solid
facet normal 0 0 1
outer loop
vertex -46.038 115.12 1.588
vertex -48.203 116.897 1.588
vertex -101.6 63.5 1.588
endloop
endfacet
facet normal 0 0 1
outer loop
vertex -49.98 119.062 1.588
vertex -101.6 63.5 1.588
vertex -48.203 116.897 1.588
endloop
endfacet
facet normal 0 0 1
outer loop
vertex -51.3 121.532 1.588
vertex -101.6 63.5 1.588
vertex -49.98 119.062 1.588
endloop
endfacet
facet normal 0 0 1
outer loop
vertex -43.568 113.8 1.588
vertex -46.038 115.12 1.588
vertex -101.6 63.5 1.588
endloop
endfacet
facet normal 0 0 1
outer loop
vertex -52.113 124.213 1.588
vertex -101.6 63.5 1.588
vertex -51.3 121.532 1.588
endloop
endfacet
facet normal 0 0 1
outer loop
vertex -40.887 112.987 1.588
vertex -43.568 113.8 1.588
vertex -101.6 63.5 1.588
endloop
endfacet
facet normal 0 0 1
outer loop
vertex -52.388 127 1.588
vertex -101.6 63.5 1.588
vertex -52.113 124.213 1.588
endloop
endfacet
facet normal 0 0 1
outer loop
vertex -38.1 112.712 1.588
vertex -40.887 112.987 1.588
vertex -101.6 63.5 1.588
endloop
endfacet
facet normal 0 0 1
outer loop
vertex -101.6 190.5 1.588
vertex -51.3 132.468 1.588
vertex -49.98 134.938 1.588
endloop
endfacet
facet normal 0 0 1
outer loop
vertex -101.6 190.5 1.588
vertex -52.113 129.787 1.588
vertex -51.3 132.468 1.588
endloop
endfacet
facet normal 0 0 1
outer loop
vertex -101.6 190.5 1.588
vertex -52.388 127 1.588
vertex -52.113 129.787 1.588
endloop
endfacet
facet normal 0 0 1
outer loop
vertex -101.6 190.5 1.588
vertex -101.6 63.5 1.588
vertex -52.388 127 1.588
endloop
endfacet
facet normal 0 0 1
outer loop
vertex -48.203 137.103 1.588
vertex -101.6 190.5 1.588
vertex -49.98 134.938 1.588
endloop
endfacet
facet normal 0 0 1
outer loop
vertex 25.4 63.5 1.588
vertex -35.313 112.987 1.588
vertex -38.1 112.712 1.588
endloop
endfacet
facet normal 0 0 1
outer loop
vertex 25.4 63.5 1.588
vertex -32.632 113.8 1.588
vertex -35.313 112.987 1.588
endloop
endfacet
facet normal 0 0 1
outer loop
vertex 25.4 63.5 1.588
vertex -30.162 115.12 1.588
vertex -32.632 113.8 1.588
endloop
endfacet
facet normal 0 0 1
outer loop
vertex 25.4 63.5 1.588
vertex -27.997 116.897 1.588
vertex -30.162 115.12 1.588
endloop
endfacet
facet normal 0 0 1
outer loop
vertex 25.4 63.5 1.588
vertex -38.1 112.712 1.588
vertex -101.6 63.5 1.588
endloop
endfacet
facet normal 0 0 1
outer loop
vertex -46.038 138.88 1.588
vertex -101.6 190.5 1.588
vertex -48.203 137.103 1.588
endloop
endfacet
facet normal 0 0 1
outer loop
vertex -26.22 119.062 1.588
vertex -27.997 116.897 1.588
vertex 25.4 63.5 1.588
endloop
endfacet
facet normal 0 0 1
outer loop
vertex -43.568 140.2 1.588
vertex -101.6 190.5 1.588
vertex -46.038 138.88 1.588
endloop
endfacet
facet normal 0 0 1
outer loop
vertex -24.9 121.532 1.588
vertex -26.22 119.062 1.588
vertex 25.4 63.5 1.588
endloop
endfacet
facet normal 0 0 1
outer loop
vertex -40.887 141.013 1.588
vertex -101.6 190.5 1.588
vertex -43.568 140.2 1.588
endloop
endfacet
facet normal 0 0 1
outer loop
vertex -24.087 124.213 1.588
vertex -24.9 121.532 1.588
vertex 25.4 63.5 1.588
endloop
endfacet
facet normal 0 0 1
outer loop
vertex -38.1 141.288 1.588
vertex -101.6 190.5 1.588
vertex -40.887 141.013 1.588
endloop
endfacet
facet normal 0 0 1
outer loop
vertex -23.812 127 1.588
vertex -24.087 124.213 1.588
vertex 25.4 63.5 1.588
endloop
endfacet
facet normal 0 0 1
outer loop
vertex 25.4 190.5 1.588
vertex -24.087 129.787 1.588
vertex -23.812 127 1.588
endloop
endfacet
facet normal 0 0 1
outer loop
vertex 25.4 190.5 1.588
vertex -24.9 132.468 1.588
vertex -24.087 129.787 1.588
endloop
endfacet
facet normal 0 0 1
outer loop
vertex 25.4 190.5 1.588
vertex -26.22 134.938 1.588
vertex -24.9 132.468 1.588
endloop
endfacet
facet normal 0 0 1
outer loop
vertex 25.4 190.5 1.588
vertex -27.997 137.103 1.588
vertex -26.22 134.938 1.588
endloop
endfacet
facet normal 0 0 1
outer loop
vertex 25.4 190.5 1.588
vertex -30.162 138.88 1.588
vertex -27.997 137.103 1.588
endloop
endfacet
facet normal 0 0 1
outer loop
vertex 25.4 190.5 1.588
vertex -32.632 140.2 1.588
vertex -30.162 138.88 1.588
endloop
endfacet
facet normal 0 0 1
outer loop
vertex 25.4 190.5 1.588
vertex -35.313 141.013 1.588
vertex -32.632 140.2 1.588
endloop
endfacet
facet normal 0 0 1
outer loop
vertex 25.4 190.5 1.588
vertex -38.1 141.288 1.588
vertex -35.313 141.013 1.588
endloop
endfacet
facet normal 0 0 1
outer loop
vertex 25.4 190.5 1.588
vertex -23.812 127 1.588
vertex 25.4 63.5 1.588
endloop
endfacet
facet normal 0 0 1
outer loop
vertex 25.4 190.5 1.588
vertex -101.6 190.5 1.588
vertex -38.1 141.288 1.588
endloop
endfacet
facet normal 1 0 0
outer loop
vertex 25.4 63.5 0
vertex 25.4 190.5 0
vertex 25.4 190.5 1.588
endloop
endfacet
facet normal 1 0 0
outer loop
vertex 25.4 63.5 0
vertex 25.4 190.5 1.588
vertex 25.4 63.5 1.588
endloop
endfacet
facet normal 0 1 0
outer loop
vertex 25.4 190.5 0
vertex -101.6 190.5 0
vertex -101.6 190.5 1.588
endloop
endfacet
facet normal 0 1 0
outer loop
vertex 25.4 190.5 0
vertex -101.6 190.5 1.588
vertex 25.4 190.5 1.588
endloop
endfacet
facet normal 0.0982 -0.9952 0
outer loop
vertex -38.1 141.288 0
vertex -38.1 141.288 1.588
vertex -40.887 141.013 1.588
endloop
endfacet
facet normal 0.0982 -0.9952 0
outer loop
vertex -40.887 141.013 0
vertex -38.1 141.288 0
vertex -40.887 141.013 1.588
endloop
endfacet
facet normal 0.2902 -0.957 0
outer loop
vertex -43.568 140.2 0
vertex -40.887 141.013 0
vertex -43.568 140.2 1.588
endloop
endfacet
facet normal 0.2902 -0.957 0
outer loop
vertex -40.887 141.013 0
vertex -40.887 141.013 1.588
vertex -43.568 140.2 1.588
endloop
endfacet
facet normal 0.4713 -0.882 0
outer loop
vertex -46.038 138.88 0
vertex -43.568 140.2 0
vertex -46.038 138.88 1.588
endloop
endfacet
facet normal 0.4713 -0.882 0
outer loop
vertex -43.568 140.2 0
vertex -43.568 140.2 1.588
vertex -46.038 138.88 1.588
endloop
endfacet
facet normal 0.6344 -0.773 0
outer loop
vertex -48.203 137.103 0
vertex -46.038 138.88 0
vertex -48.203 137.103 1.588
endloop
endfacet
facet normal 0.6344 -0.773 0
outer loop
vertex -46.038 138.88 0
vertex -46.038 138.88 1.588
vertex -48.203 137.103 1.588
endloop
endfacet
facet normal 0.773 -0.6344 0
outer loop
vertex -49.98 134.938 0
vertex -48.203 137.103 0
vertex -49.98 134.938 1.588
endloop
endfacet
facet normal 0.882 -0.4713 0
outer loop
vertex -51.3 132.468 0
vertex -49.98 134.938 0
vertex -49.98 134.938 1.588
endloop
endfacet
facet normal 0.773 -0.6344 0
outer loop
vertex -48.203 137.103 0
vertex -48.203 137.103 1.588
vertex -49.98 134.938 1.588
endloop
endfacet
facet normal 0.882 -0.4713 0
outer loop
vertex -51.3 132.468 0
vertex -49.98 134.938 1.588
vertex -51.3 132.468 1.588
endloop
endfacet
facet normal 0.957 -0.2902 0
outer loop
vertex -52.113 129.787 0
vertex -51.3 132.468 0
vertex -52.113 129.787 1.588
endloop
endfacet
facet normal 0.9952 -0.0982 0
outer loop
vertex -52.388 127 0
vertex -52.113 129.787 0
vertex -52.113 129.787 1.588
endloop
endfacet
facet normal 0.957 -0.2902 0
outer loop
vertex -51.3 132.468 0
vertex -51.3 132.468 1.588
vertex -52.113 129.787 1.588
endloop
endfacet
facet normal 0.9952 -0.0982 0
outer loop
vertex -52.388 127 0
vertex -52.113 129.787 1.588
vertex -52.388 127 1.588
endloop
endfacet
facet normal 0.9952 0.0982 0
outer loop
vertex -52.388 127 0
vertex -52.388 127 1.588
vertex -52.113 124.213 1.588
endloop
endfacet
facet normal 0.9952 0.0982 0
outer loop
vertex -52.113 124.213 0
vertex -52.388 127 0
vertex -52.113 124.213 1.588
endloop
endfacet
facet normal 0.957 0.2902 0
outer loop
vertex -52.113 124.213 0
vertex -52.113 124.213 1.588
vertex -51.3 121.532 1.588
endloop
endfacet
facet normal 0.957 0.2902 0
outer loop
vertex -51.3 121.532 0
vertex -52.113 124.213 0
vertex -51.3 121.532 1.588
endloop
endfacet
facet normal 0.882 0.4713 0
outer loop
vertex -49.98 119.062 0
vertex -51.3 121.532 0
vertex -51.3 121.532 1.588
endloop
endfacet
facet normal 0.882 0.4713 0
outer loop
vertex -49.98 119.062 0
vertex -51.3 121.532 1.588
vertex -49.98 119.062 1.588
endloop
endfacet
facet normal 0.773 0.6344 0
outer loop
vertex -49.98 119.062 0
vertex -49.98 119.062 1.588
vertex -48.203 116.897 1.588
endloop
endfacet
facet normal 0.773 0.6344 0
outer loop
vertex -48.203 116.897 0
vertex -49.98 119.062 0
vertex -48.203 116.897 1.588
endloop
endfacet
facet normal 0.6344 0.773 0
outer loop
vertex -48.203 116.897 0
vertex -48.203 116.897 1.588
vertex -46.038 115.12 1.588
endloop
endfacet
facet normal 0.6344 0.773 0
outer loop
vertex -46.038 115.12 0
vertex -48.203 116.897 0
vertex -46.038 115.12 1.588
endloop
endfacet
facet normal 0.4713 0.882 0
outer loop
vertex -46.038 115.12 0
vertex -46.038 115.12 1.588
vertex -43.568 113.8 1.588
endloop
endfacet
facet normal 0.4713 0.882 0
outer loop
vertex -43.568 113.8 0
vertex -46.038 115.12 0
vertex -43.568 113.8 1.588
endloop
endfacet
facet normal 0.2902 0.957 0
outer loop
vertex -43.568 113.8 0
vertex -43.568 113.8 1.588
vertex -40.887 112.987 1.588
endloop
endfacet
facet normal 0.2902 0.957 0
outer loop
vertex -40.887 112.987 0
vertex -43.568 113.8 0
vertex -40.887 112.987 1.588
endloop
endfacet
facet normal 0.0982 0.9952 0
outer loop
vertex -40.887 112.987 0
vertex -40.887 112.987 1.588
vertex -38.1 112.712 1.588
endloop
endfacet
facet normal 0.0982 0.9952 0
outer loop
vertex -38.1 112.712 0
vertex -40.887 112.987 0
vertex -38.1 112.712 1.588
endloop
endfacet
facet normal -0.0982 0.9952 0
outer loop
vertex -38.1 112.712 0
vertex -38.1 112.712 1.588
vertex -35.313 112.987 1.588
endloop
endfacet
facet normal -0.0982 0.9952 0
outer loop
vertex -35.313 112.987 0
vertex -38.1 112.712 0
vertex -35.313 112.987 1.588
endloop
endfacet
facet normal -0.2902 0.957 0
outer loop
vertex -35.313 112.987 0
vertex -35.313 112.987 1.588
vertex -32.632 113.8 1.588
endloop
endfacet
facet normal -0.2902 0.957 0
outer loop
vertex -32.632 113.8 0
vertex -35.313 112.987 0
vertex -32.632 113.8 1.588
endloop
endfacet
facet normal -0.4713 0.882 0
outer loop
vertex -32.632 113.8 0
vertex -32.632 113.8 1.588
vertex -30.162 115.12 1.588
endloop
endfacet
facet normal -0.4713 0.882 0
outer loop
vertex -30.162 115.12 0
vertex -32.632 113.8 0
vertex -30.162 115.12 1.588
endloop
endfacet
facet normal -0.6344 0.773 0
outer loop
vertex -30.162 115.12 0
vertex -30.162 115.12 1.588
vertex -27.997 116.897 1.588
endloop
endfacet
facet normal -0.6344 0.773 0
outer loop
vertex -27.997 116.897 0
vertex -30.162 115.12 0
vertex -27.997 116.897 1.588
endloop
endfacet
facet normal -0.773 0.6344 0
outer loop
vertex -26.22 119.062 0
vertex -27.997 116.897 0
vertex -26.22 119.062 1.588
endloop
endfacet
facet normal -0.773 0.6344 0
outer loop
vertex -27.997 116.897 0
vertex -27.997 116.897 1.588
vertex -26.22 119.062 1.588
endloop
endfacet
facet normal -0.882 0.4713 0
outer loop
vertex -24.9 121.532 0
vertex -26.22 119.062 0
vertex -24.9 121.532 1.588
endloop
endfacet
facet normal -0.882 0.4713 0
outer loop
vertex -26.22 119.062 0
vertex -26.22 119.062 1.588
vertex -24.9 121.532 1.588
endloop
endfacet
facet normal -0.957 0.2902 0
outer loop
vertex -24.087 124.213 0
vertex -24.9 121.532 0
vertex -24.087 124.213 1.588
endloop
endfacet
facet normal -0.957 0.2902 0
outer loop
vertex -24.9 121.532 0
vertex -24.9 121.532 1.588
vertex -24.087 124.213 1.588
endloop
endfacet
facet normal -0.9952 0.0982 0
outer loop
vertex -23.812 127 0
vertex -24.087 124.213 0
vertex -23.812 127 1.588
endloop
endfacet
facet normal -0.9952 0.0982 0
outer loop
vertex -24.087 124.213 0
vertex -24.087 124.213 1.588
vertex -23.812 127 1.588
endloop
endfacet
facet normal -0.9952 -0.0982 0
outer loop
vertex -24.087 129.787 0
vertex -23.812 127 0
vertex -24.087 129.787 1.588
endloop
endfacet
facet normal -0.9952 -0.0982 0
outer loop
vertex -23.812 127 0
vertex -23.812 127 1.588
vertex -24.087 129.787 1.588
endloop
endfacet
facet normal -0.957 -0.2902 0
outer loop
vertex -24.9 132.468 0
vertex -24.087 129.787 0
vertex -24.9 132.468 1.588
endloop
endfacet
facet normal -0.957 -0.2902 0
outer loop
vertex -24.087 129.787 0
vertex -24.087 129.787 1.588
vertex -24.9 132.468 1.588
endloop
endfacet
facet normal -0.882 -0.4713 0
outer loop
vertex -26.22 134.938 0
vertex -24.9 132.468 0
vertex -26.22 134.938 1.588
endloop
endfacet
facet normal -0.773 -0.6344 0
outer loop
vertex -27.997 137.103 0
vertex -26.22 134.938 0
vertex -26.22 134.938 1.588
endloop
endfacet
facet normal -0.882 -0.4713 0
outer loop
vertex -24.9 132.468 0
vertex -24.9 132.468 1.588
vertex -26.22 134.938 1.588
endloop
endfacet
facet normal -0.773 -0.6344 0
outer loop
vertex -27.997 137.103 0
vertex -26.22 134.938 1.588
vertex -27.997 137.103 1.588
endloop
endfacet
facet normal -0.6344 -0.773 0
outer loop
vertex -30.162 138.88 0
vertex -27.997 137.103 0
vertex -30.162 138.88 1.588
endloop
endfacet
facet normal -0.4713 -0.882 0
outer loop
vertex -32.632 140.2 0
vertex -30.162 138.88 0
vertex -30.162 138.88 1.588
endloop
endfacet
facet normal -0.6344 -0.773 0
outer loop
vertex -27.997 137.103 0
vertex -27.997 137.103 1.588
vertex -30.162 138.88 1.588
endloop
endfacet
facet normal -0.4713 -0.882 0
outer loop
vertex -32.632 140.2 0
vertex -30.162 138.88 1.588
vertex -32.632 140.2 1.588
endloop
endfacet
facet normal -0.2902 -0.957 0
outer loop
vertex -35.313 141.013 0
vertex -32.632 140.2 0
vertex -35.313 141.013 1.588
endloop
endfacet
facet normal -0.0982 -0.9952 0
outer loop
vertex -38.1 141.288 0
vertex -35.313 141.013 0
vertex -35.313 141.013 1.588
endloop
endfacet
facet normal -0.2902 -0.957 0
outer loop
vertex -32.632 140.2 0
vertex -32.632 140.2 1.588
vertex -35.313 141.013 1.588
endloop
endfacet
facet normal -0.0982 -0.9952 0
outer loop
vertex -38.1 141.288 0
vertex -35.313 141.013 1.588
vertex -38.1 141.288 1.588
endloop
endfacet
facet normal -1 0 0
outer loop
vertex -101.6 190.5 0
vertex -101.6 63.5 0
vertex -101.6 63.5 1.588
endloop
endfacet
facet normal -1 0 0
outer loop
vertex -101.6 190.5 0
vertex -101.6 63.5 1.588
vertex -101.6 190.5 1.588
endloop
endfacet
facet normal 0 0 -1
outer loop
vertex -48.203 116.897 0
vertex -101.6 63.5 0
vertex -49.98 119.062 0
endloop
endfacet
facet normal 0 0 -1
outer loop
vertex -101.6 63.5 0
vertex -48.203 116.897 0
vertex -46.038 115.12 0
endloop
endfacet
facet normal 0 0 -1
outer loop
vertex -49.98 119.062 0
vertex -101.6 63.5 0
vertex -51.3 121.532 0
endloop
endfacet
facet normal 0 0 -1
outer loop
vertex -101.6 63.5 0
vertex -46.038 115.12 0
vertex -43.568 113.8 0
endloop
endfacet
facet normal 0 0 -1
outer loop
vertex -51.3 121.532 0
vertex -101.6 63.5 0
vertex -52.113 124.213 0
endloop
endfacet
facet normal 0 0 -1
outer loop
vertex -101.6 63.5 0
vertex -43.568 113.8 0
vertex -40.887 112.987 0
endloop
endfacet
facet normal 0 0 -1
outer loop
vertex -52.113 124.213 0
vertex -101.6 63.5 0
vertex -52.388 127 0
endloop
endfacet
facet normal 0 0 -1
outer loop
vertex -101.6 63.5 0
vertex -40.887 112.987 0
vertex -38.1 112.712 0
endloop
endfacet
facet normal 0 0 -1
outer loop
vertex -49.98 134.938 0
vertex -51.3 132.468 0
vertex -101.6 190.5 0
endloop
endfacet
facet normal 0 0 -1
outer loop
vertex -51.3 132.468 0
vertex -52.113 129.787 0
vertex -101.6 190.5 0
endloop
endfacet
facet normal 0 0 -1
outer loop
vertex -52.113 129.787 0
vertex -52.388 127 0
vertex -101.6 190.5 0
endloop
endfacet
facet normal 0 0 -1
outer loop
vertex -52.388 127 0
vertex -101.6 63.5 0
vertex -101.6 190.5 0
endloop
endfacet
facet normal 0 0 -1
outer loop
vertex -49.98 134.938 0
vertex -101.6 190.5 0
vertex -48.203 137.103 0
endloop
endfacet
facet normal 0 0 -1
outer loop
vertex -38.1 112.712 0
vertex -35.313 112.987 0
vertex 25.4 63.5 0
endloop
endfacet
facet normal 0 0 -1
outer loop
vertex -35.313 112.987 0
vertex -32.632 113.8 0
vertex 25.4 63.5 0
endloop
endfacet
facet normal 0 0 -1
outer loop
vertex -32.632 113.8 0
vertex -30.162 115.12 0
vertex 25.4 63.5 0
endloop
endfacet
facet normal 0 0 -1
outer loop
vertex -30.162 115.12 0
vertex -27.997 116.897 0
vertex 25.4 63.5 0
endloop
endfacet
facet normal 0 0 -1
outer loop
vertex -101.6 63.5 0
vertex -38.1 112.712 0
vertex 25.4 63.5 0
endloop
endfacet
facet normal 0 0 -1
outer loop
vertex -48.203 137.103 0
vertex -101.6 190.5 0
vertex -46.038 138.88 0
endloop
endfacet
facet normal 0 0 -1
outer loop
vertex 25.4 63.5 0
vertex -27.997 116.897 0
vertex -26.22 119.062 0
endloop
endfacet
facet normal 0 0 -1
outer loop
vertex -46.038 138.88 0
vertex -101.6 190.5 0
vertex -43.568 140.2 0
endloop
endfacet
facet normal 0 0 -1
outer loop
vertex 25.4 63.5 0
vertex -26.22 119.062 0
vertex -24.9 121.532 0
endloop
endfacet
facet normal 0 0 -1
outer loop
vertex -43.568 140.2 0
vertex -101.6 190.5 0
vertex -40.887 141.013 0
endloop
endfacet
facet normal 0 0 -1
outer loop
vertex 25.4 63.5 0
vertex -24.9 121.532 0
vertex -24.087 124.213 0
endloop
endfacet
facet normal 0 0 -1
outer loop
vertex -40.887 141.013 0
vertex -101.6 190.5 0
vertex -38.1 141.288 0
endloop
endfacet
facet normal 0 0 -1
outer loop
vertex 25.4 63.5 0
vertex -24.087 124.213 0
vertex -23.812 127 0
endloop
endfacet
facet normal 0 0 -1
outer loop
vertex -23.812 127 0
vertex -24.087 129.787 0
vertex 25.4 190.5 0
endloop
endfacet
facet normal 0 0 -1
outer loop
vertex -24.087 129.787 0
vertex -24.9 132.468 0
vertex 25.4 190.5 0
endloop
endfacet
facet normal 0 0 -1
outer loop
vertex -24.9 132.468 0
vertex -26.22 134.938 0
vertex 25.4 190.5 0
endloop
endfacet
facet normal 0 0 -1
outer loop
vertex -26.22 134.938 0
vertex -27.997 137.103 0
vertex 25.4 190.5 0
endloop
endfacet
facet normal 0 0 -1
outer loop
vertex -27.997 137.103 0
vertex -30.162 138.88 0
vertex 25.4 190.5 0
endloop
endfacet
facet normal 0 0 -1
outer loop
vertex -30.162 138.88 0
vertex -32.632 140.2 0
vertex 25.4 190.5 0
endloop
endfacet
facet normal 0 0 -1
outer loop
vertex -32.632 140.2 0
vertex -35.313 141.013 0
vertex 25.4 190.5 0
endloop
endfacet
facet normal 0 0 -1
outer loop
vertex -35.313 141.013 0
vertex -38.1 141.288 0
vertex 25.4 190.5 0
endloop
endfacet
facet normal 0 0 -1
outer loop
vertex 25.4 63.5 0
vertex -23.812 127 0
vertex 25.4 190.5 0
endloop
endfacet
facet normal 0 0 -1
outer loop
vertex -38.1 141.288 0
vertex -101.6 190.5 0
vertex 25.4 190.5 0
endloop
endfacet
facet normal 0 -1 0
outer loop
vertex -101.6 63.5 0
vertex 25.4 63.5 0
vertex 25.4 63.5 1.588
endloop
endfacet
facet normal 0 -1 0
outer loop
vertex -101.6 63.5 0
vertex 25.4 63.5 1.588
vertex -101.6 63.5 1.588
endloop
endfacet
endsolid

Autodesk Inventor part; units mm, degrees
ref_plane "YZ Plane" through (0, 0, 0) normal (1, 0, 0) x (0, 1, 0)
ref_plane "XZ Plane" through (0, 0, 0) normal (0, 1, 0) x (-1, 0, 0)
ref_plane "XY Plane" through (0, 0, 0) normal (0, 0, 1) x (1, 0, 0)
sketch "Sketch1" plane through (0, 0, 0) normal (0, 0, 1) x (1, 0, 0)
  line L0 (25.4, 63.5) -> (-101.6, 63.5)
  line L1 (-101.6, 63.5) -> (-101.6, 190.5)
  line L2 (-101.6, 190.5) -> (25.4, 190.5)
  line L3 (25.4, 190.5) -> (25.4, 63.5)
  point P0 (0, 0)
  dimension "d0" = 127
  dimension "d1" = 127
extrude "Extrusion1" add sketch "Sketch1" along normal blind 1.5875
sketch "Sketch2" plane through (0, 0, 0) normal (0, 0, -1) x (-1, 0, 0)
  line L0 (-25.4, 63.5) -> (101.6, 63.5) projected
  line L1 (101.6, 63.5) -> (101.6, 190.5) projected
  line L2 (101.6, 190.5) -> (-25.4, 190.5) projected
  line L3 (-25.4, 190.5) -> (-25.4, 63.5) projected
  line L4 (38.1, 190.5) -> (38.1, 127)
  point P0 (0, 0)
  dimension "d4" = 127
  dimension "d5" = 127
  dimension "d6" = 63.5
hole "Hole1" at (-38.1, 127, 0) direction (0, 0, 1) diameter 28.575 end through all
properties part number "mountingPanelCannon"
